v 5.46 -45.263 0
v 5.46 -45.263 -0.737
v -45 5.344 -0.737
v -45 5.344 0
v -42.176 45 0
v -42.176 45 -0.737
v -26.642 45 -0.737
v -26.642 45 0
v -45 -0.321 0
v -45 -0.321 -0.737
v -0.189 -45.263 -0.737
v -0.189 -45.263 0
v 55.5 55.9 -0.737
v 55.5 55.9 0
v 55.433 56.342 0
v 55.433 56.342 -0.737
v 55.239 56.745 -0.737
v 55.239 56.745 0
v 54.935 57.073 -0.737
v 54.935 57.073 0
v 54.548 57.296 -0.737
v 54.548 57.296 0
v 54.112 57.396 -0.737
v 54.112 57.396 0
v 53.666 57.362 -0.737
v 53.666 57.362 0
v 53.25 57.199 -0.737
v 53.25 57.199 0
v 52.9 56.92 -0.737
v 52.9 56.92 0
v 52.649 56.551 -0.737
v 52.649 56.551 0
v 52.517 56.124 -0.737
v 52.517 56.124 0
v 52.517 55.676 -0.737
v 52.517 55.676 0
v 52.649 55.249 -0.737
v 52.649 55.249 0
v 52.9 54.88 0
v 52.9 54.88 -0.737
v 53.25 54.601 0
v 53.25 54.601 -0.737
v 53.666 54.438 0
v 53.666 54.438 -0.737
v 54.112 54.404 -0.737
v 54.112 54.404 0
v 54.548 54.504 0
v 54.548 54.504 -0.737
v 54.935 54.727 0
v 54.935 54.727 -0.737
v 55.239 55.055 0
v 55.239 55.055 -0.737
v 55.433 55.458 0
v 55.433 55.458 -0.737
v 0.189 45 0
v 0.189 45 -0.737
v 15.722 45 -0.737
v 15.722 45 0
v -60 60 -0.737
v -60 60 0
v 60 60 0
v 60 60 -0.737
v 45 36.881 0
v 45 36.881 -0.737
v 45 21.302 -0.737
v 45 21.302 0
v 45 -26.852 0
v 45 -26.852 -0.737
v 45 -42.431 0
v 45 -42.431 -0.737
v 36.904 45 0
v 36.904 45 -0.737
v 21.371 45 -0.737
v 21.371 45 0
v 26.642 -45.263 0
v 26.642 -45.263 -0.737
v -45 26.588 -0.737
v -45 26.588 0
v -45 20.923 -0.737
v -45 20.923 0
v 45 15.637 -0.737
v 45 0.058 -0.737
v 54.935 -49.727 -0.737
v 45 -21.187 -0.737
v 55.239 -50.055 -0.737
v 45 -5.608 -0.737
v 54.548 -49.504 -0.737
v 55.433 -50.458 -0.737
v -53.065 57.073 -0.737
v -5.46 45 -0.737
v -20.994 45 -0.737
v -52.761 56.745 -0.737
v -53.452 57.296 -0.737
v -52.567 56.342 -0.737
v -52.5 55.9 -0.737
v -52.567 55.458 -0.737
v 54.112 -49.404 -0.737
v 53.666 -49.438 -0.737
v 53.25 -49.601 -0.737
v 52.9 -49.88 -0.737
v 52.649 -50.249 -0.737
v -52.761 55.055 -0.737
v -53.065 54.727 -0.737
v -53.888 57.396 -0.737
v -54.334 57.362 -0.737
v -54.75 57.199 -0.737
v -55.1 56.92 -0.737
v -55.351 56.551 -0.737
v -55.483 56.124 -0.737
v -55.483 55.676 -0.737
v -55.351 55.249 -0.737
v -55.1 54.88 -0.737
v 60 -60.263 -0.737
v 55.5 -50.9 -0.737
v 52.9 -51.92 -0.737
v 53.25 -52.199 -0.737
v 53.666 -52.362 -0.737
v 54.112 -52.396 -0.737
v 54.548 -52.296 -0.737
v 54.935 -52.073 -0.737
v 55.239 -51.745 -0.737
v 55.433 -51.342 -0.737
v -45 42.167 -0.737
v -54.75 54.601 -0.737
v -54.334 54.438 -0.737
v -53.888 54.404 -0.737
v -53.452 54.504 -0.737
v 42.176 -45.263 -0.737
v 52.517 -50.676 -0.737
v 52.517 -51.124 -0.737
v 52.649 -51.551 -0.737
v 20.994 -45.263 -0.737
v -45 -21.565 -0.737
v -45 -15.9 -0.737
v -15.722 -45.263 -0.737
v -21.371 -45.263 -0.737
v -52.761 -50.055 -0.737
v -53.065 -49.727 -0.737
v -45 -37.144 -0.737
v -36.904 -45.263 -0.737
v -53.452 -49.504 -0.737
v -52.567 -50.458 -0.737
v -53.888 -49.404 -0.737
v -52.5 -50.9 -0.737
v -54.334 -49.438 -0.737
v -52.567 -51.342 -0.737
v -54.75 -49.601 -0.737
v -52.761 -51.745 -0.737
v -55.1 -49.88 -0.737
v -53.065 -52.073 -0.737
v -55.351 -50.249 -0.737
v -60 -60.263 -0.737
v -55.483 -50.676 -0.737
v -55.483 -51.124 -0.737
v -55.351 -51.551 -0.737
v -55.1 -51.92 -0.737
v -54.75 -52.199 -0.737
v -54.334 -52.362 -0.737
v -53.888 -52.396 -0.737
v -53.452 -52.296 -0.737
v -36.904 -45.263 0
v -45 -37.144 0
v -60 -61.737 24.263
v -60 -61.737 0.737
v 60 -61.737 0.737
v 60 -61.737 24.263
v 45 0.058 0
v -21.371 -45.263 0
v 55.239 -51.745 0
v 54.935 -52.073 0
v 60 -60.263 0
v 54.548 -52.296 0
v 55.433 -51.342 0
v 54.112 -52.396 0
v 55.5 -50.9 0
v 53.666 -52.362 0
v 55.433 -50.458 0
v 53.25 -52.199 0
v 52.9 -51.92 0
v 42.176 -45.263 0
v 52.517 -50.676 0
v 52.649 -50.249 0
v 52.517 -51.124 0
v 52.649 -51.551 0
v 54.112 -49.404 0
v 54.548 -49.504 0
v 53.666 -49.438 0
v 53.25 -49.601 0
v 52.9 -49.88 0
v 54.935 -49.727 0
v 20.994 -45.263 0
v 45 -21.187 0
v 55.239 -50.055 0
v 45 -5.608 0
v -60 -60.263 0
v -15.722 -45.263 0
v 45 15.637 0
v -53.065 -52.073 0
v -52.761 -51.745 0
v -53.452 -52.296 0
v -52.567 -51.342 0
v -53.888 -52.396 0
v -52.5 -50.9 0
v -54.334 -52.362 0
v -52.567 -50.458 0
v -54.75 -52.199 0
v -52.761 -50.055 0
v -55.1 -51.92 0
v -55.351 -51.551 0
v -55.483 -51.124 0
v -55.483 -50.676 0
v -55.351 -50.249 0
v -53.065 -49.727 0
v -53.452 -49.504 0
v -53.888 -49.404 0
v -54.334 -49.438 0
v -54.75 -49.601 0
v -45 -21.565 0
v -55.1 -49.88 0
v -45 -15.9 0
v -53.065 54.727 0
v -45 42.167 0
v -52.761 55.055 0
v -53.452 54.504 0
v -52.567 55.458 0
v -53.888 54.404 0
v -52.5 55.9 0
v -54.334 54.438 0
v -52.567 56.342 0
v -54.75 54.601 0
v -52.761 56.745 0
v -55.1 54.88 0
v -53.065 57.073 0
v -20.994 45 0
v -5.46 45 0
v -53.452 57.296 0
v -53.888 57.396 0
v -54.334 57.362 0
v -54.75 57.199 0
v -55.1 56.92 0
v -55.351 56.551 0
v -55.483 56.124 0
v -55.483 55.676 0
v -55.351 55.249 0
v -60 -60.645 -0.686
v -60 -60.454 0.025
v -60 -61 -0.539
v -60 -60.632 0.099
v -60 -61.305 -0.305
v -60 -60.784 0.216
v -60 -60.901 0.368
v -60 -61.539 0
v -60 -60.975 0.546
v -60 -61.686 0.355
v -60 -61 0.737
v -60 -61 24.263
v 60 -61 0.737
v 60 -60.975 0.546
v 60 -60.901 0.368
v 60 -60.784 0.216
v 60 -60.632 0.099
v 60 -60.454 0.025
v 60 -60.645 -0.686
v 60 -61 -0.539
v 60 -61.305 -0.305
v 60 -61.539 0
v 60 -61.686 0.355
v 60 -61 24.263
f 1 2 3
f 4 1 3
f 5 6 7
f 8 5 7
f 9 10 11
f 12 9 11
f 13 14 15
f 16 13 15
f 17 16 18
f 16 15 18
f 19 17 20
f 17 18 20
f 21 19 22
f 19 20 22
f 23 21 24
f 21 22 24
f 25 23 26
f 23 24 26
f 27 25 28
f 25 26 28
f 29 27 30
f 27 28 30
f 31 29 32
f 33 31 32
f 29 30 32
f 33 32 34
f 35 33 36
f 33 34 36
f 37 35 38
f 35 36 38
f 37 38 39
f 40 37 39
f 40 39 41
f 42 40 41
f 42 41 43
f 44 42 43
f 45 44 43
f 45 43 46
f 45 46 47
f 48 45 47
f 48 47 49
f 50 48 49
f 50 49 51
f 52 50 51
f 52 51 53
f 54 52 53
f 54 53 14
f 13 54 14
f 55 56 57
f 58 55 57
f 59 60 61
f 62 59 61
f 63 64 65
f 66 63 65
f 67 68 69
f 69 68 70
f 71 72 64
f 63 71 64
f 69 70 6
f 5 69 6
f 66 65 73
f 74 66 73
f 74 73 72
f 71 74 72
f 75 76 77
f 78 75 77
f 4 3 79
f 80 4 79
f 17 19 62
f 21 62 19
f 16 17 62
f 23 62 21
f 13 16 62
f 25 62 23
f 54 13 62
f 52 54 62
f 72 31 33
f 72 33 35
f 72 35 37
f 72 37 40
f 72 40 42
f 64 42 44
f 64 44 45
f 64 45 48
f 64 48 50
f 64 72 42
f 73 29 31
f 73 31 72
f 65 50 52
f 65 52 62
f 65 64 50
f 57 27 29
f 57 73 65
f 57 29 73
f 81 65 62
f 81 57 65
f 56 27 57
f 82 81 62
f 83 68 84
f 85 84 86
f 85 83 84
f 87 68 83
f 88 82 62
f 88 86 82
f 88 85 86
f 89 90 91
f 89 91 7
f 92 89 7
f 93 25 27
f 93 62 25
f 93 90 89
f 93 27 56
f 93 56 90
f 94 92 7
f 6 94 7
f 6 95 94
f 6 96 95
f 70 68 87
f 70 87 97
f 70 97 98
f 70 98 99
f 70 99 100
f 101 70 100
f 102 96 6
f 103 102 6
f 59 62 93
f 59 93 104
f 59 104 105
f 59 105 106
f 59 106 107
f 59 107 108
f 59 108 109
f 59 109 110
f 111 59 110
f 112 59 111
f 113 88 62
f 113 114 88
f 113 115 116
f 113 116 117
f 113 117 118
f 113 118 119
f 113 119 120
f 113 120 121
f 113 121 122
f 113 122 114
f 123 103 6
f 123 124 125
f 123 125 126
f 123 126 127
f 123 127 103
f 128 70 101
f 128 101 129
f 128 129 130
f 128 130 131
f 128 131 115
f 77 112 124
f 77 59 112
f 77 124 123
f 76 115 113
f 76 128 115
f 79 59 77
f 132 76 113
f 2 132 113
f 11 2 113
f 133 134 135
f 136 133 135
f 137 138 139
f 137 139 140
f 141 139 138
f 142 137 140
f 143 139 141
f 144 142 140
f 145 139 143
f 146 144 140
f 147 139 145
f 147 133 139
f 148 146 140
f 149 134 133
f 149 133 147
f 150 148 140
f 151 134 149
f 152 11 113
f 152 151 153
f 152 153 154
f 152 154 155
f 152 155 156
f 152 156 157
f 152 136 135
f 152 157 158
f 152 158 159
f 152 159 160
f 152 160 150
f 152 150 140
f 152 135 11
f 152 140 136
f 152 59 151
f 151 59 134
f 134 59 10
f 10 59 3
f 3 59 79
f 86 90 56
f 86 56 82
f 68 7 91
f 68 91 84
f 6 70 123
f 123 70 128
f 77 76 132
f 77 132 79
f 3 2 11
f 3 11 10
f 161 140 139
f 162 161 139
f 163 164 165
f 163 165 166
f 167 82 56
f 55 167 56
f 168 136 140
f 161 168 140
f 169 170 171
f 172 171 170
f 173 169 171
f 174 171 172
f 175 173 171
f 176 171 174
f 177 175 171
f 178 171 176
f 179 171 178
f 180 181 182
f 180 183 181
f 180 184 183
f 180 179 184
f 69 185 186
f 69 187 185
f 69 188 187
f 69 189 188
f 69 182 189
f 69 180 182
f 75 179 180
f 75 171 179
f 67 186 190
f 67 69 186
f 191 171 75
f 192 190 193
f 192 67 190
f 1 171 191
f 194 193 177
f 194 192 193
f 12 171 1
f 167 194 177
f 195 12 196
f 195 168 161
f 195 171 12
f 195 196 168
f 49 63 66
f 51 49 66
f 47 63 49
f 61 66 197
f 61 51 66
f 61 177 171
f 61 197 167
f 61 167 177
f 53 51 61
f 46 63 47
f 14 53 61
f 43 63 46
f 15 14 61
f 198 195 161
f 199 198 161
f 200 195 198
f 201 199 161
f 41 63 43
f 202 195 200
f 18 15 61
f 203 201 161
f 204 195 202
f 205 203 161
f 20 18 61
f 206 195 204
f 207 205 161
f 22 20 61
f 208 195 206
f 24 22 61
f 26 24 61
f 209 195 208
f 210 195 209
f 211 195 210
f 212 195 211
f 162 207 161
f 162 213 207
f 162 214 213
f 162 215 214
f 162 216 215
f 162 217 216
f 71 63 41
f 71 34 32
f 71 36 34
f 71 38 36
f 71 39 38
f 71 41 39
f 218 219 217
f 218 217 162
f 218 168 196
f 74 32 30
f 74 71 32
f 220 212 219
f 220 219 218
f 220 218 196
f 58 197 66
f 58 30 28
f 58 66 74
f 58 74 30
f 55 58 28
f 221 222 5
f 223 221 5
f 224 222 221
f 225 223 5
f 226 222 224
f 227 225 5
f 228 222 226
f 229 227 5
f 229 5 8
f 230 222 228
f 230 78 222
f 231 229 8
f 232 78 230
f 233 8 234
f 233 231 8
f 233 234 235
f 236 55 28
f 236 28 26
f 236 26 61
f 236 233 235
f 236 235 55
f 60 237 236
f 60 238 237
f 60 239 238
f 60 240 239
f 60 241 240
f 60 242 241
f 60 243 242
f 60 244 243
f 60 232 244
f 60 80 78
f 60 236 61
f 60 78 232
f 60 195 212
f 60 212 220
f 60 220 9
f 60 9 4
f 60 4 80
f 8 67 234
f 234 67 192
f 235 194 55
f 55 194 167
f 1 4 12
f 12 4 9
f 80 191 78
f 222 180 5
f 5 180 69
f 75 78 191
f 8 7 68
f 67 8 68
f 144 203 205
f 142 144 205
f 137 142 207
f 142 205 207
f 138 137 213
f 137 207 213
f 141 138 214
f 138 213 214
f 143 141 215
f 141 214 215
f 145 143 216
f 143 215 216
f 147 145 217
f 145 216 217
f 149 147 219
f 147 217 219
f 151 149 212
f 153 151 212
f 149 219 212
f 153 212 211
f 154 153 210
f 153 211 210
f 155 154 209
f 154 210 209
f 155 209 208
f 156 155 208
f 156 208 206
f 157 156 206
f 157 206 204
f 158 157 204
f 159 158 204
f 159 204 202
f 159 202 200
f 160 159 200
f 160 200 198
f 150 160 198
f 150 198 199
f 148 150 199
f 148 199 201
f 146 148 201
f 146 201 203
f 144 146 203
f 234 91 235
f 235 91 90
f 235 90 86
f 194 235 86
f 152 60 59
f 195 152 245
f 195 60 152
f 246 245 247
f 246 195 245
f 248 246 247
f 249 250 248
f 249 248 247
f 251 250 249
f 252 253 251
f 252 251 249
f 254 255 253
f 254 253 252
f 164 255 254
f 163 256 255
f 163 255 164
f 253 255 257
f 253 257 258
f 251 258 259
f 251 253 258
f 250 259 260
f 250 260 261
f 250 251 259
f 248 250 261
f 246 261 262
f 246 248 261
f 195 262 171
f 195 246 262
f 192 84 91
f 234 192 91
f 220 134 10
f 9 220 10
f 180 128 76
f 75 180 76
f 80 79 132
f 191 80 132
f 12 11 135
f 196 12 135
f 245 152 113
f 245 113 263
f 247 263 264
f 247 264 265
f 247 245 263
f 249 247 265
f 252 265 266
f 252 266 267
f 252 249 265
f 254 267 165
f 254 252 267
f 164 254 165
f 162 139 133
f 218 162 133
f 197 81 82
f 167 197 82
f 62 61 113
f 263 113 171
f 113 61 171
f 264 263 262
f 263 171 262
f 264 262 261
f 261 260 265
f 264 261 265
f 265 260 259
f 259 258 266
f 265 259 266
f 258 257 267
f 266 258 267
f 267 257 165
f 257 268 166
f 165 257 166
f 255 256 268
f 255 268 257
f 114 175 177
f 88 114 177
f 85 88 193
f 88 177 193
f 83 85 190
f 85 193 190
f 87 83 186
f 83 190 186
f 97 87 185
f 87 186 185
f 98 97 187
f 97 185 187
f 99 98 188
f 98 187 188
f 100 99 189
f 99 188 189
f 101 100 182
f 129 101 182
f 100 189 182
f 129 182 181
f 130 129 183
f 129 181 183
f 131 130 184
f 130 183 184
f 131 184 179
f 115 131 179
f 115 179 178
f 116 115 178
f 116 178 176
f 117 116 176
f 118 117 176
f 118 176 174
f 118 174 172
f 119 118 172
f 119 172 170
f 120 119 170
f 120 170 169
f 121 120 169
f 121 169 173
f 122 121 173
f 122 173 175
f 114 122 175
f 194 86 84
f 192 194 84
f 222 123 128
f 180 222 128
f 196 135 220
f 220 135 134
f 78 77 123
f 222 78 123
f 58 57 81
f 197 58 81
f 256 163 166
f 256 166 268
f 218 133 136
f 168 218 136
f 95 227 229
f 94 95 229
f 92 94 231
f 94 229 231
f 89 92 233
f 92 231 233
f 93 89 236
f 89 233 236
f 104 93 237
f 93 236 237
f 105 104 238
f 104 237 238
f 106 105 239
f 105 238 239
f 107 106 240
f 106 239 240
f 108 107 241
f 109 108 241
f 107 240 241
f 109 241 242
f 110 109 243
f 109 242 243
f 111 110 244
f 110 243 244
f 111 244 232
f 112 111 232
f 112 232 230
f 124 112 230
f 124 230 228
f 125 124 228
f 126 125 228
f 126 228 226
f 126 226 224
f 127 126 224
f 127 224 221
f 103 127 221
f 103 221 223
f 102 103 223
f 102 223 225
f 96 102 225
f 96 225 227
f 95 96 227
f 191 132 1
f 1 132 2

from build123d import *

# Parameters (mm, degrees)
SKETCH1_W          = 120
SKETCH1_H          = 120
BASE_FLANGE1_DEPTH = 0.7366
EDGE_FLANGE1_DEPTH = 120
SKETCH25_R         = 1.5
CUT_EXTRUDE1_DEPTH = 161.891420775
CUT_EXTRUDE2_DEPTH = 10


# Sheet-metal steps are written as plain solids
with BuildPart() as part:
    # Sketch1 → Base-Flange1 (new body)
    with BuildSketch(Plane.XY):
        Rectangle(SKETCH1_W, SKETCH1_H)
    extrude(amount=-BASE_FLANGE1_DEPTH)

    # Edge-Flange1 section (across the edge) → Edge-Flange1 (add)
    with BuildSketch(Plane(origin=(-60, -61, 0), x_dir=(0, 1, 0), z_dir=(1, 0, 0))):
        with BuildLine():
            Line((-0.7366, 0.7366), (-0.7366, 24.2634))
            Line((-0.7366, 24.2634), (0, 24.2634))
            Line((0, 24.2634), (0, 0.7366))
            ThreePointArc((0, 0.7366), (0.215745145, 0.215745145), (0.7366, 0))
            Line((0.7366, 0), (1, 0))
            Line((1, 0), (1, -0.7366))
            Line((1, -0.7366), (0.7366, -0.7366))
            ThreePointArc((0.7366, -0.7366), (-0.30510971, -0.30510971), (-0.7366, 0.7366))
        make_face()
    extrude(amount=EDGE_FLANGE1_DEPTH)

    # Sketch25 → Cut-Extrude1 (cut, through all)
    with BuildSketch(Plane(origin=(-46.34767359, -57.645882303, 26.3866), x_dir=(1, 0, 0), z_dir=(0, 0, 1))):
        with Locations((-7.65232641, 6.745882303)):
            Circle(SKETCH25_R)
        with Locations((100.34767359, 113.545882303)):
            Circle(SKETCH25_R)
        with Locations((100.34767359, 6.745882303)):
            Circle(SKETCH25_R)
        with Locations((-7.65232641, 113.545882303)):
            Circle(SKETCH25_R)
    extrude(amount=-CUT_EXTRUDE1_DEPTH, mode=Mode.SUBTRACT)

    # Sketch26 → Cut-Extrude2 (cut)
    with BuildSketch(Plane(origin=(0, 0, -0.7366), x_dir=(-1, 0, 0), z_dir=(0, 0, -1))):
        Polygon((45, -15.899963077), (45, -0.320923852), (0.188671673, -45.2634), (15.722249294, -45.2634), align=None)
        Polygon((21.370855866, -45.2634), (36.904433487, -45.2634), (45, -37.144140463), (45, -21.565101238), align=None)
        Polygon((-20.993512521, -45.2634), (-5.459934899, -45.2634), (45, 5.344214309), (45, 20.923253534), align=None)
        Polygon((-45, -26.851791695), (-45, -42.43083092), (42.175696714, 45), (26.642119093, 45), align=None)
        Polygon((-45, -5.607614309), (-45, -21.186653534), (20.993512521, 45), (5.459934899, 45), align=None)
        Polygon((-45, 15.636563077), (-45, 0.057523852), (-0.188671673, 45), (-15.722249294, 45), align=None)
        Polygon((-45, 36.880740463), (-45, 21.301701238), (-21.370855866, 45), (-36.904433487, 45), align=None)
        Polygon((45, 26.588391695), (45, 42.16743092), (-42.175696714, -45.2634), (-26.642119093, -45.2634), align=None)
    extrude(amount=-CUT_EXTRUDE2_DEPTH, mode=Mode.SUBTRACT)


solid = part.part
